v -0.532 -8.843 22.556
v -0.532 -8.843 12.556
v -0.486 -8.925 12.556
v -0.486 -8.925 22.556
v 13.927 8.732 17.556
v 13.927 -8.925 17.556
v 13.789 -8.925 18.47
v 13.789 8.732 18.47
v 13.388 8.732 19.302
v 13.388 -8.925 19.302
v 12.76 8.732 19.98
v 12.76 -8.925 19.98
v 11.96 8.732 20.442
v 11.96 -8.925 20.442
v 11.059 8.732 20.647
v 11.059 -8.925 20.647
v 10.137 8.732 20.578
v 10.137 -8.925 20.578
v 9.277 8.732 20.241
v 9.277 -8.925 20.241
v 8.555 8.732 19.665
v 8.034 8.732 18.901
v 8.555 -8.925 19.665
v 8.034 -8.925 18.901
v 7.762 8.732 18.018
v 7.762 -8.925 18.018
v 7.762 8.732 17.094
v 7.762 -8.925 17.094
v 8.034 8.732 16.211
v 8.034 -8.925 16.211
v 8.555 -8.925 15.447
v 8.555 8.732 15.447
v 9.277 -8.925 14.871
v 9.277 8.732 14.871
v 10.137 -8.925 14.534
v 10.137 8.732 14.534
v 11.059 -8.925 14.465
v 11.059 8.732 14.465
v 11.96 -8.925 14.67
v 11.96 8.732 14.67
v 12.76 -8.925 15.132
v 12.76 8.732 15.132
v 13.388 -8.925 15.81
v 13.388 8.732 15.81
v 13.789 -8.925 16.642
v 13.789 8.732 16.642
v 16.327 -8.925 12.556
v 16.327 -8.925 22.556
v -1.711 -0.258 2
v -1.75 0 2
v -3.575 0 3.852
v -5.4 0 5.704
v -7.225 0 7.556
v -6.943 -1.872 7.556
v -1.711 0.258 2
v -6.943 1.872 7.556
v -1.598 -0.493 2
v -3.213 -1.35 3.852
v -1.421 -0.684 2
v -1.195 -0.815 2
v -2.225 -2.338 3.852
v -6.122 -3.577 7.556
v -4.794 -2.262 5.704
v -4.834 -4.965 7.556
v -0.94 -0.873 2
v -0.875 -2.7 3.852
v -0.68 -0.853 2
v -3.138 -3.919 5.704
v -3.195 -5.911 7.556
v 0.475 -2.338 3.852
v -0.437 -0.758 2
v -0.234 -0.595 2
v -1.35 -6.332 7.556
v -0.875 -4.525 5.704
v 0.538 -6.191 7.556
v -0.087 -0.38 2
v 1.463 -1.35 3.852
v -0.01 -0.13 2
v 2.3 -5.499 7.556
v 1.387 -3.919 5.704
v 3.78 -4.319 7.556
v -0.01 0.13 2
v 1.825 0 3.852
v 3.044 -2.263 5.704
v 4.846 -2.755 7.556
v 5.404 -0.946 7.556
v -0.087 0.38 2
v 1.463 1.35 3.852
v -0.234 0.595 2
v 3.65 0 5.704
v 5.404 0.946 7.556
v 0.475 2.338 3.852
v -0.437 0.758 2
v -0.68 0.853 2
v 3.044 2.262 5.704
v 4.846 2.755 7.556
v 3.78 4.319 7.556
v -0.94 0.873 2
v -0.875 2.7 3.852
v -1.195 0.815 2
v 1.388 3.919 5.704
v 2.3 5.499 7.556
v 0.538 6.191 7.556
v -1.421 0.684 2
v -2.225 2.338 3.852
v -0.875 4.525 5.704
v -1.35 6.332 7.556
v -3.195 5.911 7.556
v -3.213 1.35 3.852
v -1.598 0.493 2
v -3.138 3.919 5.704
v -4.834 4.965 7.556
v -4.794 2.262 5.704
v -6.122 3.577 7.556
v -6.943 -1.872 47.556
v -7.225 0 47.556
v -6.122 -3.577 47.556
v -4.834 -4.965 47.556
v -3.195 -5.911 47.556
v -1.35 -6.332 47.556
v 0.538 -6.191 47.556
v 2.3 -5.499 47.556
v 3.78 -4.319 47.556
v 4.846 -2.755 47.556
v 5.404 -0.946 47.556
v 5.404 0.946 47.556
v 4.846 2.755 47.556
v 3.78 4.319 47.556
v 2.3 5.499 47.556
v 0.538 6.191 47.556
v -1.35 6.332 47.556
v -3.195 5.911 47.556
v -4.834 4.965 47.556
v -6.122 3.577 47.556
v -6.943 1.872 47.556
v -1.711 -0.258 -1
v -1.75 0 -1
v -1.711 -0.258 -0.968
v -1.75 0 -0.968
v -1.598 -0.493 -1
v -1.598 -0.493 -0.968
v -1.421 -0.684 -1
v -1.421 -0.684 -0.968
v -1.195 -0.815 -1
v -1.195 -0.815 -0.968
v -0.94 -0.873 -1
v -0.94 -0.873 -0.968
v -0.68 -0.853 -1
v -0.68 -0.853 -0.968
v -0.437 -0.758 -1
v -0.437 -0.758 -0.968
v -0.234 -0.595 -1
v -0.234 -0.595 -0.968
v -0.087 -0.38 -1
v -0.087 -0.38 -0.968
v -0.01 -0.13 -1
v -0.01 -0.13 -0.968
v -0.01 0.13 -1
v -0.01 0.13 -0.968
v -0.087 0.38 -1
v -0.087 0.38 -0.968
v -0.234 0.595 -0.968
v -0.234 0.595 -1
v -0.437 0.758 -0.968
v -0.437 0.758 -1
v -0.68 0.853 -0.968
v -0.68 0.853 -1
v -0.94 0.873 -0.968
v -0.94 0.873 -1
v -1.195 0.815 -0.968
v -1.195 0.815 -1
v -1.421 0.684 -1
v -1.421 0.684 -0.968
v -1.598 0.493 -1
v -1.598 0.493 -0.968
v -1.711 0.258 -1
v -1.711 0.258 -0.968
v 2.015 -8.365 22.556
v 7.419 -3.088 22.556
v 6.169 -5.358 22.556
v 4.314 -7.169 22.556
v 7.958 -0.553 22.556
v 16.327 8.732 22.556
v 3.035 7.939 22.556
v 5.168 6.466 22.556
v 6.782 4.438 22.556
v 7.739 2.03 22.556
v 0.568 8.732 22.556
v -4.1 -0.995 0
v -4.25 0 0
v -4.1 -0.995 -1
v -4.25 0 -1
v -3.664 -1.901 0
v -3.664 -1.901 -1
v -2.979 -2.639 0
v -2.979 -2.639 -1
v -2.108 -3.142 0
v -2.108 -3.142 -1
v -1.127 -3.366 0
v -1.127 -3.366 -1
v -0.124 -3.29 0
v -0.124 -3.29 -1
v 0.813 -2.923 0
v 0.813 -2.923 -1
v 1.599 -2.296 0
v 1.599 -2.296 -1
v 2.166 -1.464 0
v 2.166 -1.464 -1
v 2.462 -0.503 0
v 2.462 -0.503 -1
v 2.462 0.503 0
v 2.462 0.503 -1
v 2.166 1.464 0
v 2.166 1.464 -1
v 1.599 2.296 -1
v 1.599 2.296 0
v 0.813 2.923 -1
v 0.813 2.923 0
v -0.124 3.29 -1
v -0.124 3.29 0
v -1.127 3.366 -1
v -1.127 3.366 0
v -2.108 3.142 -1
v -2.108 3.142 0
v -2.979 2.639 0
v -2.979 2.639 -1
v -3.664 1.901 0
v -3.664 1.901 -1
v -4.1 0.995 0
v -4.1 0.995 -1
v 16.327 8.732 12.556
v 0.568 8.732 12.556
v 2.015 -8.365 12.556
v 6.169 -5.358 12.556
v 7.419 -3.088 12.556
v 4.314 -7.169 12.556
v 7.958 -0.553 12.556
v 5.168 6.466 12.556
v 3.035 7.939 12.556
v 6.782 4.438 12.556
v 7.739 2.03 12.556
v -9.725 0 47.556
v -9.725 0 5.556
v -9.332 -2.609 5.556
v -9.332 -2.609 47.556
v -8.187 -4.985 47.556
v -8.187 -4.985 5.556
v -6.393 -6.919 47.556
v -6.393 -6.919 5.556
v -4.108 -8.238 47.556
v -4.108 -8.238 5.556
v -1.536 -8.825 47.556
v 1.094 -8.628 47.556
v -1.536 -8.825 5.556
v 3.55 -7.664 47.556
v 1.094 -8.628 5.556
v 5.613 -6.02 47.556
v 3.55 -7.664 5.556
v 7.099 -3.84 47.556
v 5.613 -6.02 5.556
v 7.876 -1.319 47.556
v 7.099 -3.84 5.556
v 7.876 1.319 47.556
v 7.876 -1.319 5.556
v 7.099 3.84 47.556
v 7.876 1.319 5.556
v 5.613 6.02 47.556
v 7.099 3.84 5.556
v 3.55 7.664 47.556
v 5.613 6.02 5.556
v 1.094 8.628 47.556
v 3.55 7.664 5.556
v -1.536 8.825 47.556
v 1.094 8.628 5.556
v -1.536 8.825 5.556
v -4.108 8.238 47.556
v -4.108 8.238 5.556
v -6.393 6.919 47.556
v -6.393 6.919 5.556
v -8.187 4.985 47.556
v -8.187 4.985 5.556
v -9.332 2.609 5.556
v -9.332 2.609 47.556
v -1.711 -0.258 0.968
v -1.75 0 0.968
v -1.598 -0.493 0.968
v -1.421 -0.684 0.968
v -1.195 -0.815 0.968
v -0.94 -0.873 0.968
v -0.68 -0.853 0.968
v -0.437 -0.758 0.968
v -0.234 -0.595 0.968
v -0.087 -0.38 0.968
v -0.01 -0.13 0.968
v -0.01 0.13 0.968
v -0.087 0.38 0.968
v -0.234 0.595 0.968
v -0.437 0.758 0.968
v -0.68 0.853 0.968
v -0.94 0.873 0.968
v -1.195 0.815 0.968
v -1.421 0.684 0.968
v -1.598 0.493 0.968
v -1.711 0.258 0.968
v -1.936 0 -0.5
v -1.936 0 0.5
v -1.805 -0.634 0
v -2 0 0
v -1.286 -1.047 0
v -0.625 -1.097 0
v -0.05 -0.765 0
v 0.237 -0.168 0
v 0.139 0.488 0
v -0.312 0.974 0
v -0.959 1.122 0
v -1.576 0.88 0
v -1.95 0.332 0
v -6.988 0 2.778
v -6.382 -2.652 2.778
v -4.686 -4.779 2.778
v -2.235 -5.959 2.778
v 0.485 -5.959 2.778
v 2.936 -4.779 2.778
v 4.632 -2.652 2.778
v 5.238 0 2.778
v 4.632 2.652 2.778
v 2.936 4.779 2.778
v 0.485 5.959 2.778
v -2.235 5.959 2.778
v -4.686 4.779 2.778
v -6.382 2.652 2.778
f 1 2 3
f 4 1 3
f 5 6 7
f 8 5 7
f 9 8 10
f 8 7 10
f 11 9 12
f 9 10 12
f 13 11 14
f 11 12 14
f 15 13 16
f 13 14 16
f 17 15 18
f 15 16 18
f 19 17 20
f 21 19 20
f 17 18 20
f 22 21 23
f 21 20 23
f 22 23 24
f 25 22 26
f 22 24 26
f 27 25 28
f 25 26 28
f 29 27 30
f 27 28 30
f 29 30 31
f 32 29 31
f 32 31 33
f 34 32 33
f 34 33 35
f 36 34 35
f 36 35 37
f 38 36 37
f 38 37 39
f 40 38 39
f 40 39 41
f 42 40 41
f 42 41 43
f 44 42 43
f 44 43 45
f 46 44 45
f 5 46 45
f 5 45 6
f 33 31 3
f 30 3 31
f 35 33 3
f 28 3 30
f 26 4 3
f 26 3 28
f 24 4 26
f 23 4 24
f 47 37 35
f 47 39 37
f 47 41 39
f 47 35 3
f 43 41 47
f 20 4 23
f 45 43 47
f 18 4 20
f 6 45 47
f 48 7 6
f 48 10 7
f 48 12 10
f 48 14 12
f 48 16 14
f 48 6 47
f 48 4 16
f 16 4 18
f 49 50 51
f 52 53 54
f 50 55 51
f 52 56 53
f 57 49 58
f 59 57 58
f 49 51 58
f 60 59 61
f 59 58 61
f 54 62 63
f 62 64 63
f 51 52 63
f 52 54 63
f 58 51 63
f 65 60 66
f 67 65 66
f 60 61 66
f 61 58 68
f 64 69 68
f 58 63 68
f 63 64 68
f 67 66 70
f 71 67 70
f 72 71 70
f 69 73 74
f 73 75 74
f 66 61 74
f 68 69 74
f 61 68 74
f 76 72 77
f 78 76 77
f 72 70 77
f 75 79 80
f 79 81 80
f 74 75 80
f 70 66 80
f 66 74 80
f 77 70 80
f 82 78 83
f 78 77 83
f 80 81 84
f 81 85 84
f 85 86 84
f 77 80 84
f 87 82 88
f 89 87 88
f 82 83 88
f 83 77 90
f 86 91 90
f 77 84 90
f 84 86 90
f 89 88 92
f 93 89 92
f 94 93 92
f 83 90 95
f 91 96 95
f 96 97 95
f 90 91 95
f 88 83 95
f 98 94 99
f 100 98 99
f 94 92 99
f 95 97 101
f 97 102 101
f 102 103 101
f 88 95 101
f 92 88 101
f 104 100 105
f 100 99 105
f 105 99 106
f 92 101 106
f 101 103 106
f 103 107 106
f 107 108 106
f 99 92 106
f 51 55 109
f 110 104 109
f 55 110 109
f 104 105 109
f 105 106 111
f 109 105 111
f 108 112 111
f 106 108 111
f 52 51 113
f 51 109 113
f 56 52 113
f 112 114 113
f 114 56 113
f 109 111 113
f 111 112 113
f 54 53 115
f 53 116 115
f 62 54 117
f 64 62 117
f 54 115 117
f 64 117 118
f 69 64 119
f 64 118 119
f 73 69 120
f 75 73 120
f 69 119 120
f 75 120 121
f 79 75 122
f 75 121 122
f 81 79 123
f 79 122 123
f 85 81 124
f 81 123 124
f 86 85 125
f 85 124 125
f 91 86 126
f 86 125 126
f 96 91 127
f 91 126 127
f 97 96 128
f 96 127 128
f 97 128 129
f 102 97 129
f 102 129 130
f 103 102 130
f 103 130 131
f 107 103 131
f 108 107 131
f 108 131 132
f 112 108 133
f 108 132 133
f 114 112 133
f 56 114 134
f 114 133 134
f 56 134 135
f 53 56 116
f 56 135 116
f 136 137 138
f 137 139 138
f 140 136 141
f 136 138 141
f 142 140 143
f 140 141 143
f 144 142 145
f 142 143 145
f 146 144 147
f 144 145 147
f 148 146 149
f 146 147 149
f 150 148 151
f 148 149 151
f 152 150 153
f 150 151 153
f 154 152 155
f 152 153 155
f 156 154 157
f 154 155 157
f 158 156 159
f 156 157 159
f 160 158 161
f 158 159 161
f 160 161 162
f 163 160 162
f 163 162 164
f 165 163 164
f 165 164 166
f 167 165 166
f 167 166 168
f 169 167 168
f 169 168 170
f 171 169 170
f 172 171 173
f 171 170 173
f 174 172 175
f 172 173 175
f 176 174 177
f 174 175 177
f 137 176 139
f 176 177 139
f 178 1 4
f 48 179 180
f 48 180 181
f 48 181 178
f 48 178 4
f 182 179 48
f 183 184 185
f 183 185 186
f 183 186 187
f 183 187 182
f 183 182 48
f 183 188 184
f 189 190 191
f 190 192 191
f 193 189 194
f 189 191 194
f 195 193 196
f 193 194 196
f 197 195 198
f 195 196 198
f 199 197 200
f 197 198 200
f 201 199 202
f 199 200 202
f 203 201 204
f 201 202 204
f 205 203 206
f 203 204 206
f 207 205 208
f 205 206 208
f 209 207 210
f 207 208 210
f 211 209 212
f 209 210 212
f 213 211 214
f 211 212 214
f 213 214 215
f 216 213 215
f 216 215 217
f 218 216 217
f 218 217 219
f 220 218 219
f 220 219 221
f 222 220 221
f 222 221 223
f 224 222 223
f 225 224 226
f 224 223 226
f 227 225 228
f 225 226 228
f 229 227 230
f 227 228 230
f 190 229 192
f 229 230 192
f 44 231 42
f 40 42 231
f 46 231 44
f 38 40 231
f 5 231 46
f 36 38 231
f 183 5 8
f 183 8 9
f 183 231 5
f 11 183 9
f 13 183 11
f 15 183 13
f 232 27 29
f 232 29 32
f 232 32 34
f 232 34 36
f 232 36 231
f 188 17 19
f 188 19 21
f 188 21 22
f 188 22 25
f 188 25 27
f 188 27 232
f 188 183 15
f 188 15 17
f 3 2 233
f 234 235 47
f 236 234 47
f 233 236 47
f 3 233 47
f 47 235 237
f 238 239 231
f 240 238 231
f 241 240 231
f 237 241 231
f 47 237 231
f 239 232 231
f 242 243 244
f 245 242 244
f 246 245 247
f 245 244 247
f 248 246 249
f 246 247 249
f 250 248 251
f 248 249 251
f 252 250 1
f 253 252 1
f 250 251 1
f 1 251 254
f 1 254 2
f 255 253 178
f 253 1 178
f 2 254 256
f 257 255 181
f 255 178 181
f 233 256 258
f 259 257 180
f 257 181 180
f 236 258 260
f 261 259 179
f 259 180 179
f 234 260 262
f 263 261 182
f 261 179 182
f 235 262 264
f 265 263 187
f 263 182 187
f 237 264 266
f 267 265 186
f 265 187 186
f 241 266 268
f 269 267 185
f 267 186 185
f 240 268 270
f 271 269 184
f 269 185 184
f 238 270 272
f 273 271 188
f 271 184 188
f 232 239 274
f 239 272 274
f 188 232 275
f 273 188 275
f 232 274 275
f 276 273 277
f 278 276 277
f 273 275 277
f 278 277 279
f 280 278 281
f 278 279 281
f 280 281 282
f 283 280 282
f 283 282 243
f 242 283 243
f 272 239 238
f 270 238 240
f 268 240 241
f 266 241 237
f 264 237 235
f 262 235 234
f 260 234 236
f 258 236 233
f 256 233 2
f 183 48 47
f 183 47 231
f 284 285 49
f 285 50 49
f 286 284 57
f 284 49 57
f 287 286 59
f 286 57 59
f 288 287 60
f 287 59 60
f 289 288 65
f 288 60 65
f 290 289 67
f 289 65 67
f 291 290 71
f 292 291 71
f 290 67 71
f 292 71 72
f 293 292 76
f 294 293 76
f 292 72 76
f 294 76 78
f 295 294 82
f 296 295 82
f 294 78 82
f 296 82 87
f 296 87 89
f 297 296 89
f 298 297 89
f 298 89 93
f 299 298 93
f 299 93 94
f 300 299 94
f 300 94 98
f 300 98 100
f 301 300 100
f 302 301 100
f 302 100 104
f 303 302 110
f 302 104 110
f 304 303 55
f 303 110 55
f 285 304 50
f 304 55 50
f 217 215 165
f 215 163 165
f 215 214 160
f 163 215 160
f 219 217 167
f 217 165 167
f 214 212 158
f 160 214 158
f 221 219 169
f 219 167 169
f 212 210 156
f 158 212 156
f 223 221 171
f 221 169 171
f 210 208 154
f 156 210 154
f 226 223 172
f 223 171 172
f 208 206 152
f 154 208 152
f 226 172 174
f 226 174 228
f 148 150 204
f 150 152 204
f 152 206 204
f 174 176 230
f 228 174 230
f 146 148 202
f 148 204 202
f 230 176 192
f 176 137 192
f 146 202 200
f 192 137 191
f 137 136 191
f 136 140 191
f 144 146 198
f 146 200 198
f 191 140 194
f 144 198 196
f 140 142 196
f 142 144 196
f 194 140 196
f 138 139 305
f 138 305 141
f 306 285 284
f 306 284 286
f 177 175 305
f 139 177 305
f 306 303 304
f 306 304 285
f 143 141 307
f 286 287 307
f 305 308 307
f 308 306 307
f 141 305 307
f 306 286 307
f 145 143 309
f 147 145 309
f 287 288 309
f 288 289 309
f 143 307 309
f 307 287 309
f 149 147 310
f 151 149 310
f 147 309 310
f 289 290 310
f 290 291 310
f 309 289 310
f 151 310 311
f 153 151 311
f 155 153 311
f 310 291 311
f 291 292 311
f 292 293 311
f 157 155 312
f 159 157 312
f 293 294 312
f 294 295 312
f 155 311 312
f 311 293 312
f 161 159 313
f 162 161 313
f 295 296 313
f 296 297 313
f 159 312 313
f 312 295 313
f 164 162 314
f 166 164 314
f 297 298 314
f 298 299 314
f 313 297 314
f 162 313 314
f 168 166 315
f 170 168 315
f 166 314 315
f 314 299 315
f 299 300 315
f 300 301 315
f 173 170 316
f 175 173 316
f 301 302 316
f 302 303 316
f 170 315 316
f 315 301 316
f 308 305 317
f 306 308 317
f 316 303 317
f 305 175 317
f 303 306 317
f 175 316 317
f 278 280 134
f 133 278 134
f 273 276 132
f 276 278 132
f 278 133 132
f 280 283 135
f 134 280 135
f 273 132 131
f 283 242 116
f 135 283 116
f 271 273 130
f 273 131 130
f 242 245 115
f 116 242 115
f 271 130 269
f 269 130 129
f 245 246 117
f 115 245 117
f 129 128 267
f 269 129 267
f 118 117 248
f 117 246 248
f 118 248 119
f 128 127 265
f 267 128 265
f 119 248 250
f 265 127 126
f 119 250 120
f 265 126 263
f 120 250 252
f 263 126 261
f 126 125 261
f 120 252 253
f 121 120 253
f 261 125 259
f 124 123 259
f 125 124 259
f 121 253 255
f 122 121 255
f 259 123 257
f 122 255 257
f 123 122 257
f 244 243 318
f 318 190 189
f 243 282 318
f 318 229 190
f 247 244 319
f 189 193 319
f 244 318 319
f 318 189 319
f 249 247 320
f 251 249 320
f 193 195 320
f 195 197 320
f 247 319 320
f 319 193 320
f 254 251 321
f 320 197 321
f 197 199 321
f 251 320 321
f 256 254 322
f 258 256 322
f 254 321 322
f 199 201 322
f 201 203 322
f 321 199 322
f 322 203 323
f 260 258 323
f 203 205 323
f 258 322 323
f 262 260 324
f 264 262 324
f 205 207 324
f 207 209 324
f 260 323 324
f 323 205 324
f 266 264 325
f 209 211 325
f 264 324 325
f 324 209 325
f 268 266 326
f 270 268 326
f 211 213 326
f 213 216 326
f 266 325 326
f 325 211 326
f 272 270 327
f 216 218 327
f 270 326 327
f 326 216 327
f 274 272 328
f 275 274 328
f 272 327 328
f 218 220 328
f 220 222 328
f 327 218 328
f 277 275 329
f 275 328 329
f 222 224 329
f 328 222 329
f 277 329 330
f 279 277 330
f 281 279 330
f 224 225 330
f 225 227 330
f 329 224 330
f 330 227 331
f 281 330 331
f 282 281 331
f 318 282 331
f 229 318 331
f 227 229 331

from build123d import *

# Parameters (mm, degrees)
F6_DEPTH = 10
F7_R     = 3.1
F8_DEPTH = 25


with BuildPart() as f2:
    # F1 (on face) → F2 (revolve)
    with BuildSketch(Plane.XZ):
        Polygon((-9.725, 7.55602537), (-7.225, 7.55602537), (-7.225, 23.8076150417), (-7.225, 47.55602537), (-9.725, 47.55602537), align=None)
        with BuildLine():
            ThreePointArc((-1.75, -0.9682458366), (-2, 0), (-1.75, 0.9682458366))
            Line((-1.75, 0.9682458366), (-1.75, 2))
            Line((-1.75, 2), (-7.225, 7.55602537))
            Line((-7.225, 7.55602537), (-9.725, 7.55602537))
            Line((-9.725, 7.55602537), (-9.725, 5.55602537))
            Line((-9.725, 5.55602537), (-4.25, 0))
            Line((-4.25, 0), (-4.25, -1))
            Line((-4.25, -1), (-1.75, -1))
            Line((-1.75, -1), (-1.75, -0.9682458366))
        make_face()
    revolve(axis=Axis((-0.875, 0, 3), (0, 0, 1)))

    # F5 (on offset) → F6 (join)
    with BuildSketch(Plane.XY.offset(22.55602537)):
        Polygon((16.3270153056, 8.7316431165), (0.3520153056, 8.7316431165), (5.1758266054, 5.5884346366), (6.8773869425, -0.8869493031), (5.2230921574, -4.3846019544), (1.3945804676, -7.4095986784), (-0.9214326274, -8.1658484414), (-0.4856002192, -8.9249160441), (8.3270153056, -8.9249160441), (12.3188967407, -8.9249160441), (16.3270153056, -8.9249160441), (16.3270153056, -0.0749950048), align=None)
    extrude(amount=-F6_DEPTH)

    # F7 (on face) → F8 (cut)
    with BuildSketch(Plane.XZ.offset(8.9249160441)):
        with Locations((10.8270153056, 17.55602537)):
            Circle(F7_R)
    extrude(amount=-F8_DEPTH, mode=Mode.SUBTRACT)


solid = f2.part
